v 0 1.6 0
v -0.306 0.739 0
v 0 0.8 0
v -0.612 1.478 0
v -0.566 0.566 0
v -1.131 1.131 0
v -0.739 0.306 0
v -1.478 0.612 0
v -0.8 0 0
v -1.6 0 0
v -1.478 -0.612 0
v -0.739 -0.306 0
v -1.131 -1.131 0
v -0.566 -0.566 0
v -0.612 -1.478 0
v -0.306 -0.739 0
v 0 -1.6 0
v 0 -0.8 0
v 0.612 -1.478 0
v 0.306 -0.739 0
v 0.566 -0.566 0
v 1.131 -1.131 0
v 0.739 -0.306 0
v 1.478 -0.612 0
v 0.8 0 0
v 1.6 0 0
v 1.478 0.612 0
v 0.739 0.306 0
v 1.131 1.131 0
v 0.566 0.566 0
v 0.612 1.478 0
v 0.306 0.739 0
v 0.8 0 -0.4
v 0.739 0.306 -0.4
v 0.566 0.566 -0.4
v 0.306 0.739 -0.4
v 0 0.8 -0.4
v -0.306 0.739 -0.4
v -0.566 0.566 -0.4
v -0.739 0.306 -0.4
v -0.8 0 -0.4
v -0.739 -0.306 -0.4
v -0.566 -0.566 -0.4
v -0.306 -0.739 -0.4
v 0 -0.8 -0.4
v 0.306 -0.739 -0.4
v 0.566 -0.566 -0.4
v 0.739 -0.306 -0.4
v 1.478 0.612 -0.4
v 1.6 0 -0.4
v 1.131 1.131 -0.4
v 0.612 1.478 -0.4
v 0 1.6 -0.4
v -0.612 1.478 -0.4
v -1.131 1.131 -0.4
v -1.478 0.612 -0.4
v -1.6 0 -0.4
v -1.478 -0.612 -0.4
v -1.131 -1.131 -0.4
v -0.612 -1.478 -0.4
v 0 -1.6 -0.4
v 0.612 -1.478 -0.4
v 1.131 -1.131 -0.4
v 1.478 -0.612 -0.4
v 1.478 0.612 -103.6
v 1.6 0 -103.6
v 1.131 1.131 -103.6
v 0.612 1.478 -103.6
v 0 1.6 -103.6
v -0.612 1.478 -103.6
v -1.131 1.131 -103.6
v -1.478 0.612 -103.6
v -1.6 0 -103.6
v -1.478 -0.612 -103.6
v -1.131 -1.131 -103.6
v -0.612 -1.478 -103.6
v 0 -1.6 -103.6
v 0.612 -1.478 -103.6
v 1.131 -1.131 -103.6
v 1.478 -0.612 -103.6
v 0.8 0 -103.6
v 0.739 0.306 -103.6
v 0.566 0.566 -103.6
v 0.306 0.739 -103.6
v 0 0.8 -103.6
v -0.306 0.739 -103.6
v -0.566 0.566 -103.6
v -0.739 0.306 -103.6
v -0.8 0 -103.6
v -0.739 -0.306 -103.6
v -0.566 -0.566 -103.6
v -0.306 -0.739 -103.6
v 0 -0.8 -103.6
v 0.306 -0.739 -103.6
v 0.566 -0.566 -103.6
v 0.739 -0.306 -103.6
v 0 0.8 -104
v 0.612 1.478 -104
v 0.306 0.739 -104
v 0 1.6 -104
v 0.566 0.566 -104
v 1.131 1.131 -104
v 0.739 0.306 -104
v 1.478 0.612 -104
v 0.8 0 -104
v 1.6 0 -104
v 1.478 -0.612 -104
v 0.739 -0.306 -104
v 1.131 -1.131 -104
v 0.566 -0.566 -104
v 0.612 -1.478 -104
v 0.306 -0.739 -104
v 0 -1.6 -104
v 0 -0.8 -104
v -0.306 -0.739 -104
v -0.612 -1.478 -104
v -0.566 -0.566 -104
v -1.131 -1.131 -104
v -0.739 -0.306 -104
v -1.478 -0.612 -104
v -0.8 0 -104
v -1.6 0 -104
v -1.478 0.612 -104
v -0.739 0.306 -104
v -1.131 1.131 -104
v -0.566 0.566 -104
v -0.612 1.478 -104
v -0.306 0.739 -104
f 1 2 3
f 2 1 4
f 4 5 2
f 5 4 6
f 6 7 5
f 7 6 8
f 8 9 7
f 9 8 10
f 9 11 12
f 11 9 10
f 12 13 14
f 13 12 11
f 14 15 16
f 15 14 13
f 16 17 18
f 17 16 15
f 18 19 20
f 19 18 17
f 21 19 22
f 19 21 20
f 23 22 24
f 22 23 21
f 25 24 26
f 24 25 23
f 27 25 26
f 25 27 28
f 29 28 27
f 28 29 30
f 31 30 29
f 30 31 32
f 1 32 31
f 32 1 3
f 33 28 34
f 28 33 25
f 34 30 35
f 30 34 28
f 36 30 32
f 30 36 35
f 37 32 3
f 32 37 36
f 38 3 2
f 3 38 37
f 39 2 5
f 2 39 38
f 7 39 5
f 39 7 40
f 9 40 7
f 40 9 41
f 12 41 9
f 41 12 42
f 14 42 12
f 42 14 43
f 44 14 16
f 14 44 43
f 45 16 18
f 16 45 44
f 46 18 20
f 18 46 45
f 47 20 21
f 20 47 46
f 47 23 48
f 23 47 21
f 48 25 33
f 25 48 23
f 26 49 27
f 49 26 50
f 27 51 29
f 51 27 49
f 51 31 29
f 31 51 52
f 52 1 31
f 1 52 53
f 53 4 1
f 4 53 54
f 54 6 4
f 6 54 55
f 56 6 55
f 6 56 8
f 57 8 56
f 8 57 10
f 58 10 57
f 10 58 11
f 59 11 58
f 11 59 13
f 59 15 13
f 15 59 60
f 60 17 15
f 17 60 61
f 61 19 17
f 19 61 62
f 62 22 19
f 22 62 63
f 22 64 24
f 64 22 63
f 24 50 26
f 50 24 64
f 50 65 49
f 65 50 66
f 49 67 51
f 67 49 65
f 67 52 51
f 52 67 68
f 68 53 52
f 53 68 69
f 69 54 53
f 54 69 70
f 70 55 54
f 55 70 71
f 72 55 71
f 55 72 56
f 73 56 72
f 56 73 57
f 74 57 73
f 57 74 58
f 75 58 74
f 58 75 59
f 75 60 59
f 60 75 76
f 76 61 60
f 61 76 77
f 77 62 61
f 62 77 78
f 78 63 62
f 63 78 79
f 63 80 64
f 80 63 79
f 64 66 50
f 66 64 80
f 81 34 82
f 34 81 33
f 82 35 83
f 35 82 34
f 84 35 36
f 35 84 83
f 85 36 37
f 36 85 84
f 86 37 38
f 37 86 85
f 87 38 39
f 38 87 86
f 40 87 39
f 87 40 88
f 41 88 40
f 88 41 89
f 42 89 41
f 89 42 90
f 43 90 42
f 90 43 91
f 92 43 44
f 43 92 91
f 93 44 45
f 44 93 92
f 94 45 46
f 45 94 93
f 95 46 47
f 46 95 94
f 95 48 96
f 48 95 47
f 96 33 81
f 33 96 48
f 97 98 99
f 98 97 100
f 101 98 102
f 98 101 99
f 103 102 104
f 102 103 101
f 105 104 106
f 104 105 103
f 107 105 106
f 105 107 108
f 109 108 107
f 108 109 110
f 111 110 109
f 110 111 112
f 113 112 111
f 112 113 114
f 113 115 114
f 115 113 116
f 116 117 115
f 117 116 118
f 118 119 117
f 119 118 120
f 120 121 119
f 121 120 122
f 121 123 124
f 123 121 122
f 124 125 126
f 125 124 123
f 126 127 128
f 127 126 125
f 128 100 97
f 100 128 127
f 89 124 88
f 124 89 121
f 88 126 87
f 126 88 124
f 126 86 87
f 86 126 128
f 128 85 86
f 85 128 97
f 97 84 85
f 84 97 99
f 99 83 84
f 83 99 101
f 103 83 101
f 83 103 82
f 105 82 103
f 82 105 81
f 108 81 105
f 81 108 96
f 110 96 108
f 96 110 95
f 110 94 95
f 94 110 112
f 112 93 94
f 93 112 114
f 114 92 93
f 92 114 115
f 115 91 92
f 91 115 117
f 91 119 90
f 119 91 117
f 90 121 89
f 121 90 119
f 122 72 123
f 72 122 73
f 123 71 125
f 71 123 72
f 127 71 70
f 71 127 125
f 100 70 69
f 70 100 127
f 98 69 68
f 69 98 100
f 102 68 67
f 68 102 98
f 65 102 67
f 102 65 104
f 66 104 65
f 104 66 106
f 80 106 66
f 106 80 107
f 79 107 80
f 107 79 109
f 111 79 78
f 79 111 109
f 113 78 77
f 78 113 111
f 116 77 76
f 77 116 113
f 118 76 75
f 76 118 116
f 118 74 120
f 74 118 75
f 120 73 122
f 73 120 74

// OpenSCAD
// file: ../p/4-4disc.scad
use <../lib.scad>
$fa=1; $fs=0.2;
function ldraw_lib__4_4disc(realsolid=false) = [
// 0 Disc 1.0
// 0 Name: 4-4disc.dat
// 0 Author: James Jessiman
// 0 !LDRAW_ORG Primitive UPDATE 2002-02
// 0 !LICENSE Licensed under CC BY 2.0 and CC BY 4.0 : see CAreadme.txt
// 
// 0 BFC CERTIFY CCW
  [0,"BFC","CERTIFY"],
  [0,"BFC","CCW"],
// 
// 0 !HISTORY 1998-12-15 [PTadmin] Official Update 1998-10
// 0 !HISTORY 2002-03-23 [sbliss] Added BFC statement
// 0 !HISTORY 2002-04-25 [PTadmin] Official Update 2002-02
// 0 !HISTORY 2007-06-24 [PTadmin] Header formatted for Contributor Agreement
// 0 !HISTORY 2008-07-01 [PTadmin] Official Update 2008-01
// 
// 
// 3 16 0 0 0 1 0 0 0.9239 0 0.3827
  [3,16,0,0,0,1,0,0,0.9239,0,0.3827],
// 3 16 0 0 0 0.9239 0 0.3827 0.7071 0 0.7071
  [3,16,0,0,0,0.9239,0,0.3827,0.7071,0,0.7071],
// 3 16 0 0 0 0.7071 0 0.7071 0.3827 0 0.9239
  [3,16,0,0,0,0.7071,0,0.7071,0.3827,0,0.9239],
// 3 16 0 0 0 0.3827 0 0.9239 0 0 1
  [3,16,0,0,0,0.3827,0,0.9239,0,0,1],
// 3 16 0 0 0 0 0 1 -0.3827 0 0.9239
  [3,16,0,0,0,0,0,1,-0.3827,0,0.9239],
// 3 16 0 0 0 -0.3827 0 0.9239 -0.7071 0 0.7071
  [3,16,0,0,0,-0.3827,0,0.9239,-0.7071,0,0.7071],
// 3 16 0 0 0 -0.7071 0 0.7071 -0.9239 0 0.3827
  [3,16,0,0,0,-0.7071,0,0.7071,-0.9239,0,0.3827],
// 3 16 0 0 0 -0.9239 0 0.3827 -1 0 -0
  [3,16,0,0,0,-0.9239,0,0.3827,-1,0,-0],
// 3 16 0 0 0 -1 0 -0 -0.9239 0 -0.3827
  [3,16,0,0,0,-1,0,-0,-0.9239,0,-0.3827],
// 3 16 0 0 0 -0.9239 0 -0.3827 -0.7071 0 -0.7071
  [3,16,0,0,0,-0.9239,0,-0.3827,-0.7071,0,-0.7071],
// 3 16 0 0 0 -0.7071 0 -0.7071 -0.3827 0 -0.9239
  [3,16,0,0,0,-0.7071,0,-0.7071,-0.3827,0,-0.9239],
// 3 16 0 0 0 -0.3827 0 -0.9239 0 0 -1
  [3,16,0,0,0,-0.3827,0,-0.9239,0,0,-1],
// 3 16 0 0 0 0 0 -1 0.3827 0 -0.9239
  [3,16,0,0,0,0,0,-1,0.3827,0,-0.9239],
// 3 16 0 0 0 0.3827 0 -0.9239 0.7071 0 -0.7071
  [3,16,0,0,0,0.3827,0,-0.9239,0.7071,0,-0.7071],
// 3 16 0 0 0 0.7071 0 -0.7071 0.9239 0 -0.3827
  [3,16,0,0,0,0.7071,0,-0.7071,0.9239,0,-0.3827],
// 3 16 0 0 0 0.9239 0 -0.3827 1 0 0
  [3,16,0,0,0,0.9239,0,-0.3827,1,0,0],
// 0
];
module ldraw_lib__4_4disc(step=0, col=false, unit=2/5, alt=false, line=0.2, solid=!$preview)
    makepoly(ldraw_lib__4_4disc(solid), step=step, col=col, unit=unit, alt=alt, line=line, solid=solid);
ldraw_lib__4_4disc(line=0.2);
// file: ../p/stud3.scad
use <../lib.scad>
use <4-4cyli.scad>
use <4-4disc.scad>
use <4-4edge.scad>
$fa=1; $fs=0.2;
function ldraw_lib__stud3(realsolid=false) = realsolid ? 
    [openscad(translate([0,0,-eps()], o=cylinder(4+eps(), r=4)),2)] : [
// 0 Stud Tube Solid
// 0 Name: stud3.dat
// 0 Author: James Jessiman
// 0 !LDRAW_ORG Primitive UPDATE 2012-01
// 0 !LICENSE Licensed under CC BY 2.0 and CC BY 4.0 : see CAreadme.txt
// 
// 0 BFC CERTIFY CCW
  [0,"BFC","CERTIFY"],
  [0,"BFC","CCW"],
// 
// 0 !HISTORY 2002-04-04 [sbliss] Modified for BFC compliance
// 0 !HISTORY 2002-04-25 [PTadmin] Official Update 2002-02
// 0 !HISTORY 2007-06-24 [PTadmin] Header formatted for Contributor Agreement
// 0 !HISTORY 2008-07-01 [PTadmin] Official Update 2008-01
// 0 !HISTORY 2012-02-16 [Philo] Changed to CCW
// 0 !HISTORY 2012-03-30 [PTadmin] Official Update 2012-01
// 
// 
// 1 16 0 -4 0 4 0 0 0 1 0 0 0 4 4-4edge.dat
  [1,16,0,-4,0,4,0,0,0,1,0,0,0,4, ldraw_lib__4_4edge(realsolid)],
// 1 16 0 0 0 4 0 0 0 1 0 0 0 4 4-4edge.dat
  [1,16,0,0,0,4,0,0,0,1,0,0,0,4, ldraw_lib__4_4edge(realsolid)],
// 1 16 0 -4 0 4 0 0 0 1 0 0 0 4 4-4disc.dat
  [1,16,0,-4,0,4,0,0,0,1,0,0,0,4, ldraw_lib__4_4disc(realsolid)],
// 1 16 0 -4 0 4 0 0 0 4 0 0 0 4 4-4cyli.dat
  [1,16,0,-4,0,4,0,0,0,4,0,0,0,4, ldraw_lib__4_4cyli(realsolid)],
];
module ldraw_lib__stud3(step=0, col=false, unit=2/5, alt=false, line=0.2, solid=!$preview)
    makepoly(ldraw_lib__stud3(solid), step=step, col=col, unit=unit, alt=alt, line=line, solid=solid);
ldraw_lib__stud3(line=0.2);
// file: ../p/stud.scad
use <../lib.scad>
use <4-4cyli.scad>
use <4-4disc.scad>
use <4-4edge.scad>
$fa=1; $fs=0.2;
function ldraw_lib__stud(realsolid=false) = realsolid ? 
    [openscad(translate([0,0,-eps()], o=cylinder(4+eps(), r=6)),2)] : [
// 0 Stud
// 0 Name: stud.dat
// 0 Author: James Jessiman
// 0 !LDRAW_ORG Primitive UPDATE 2012-01
// 0 !LICENSE Licensed under CC BY 2.0 and CC BY 4.0 : see CAreadme.txt
// 
// 0 BFC CERTIFY CCW
  [0,"BFC","CERTIFY"],
  [0,"BFC","CCW"],
// 
// 0 !HISTORY 2002-04-04 [sbliss] Modified for BFC compliance
// 0 !HISTORY 2002-04-25 [PTadmin] Official Update 2002-02
// 0 !HISTORY 2007-06-24 [PTadmin] Header formatted for Contributor Agreement
// 0 !HISTORY 2008-07-01 [PTadmin] Official Update 2008-01
// 0 !HISTORY 2012-02-16 [Philo] Changed to CCW
// 0 !HISTORY 2012-03-30 [PTadmin] Official Update 2012-01
// 
// 
// 1 16 0 0 0 6 0 0 0 1 0 0 0 6 4-4edge.dat
  [1,16,0,0,0,6,0,0,0,1,0,0,0,6, ldraw_lib__4_4edge(realsolid)],
// 1 16 0 -4 0 6 0 0 0 1 0 0 0 6 4-4edge.dat
  [1,16,0,-4,0,6,0,0,0,1,0,0,0,6, ldraw_lib__4_4edge(realsolid)],
// 1 16 0 0 0 6 0 0 0 -4 0 0 0 6 4-4cyli.dat
  [1,16,0,0,0,6,0,0,0,-4,0,0,0,6, ldraw_lib__4_4cyli(realsolid)],
// 1 16 0 -4 0 6 0 0 0 1 0 0 0 6 4-4disc.dat
  [1,16,0,-4,0,6,0,0,0,1,0,0,0,6, ldraw_lib__4_4disc(realsolid)],
];
module ldraw_lib__stud(step=0, col=false, unit=2/5, alt=false, line=0.2, solid=!$preview)
    makepoly(ldraw_lib__stud(solid), step=step, col=col, unit=unit, alt=alt, line=line, solid=solid);
ldraw_lib__stud(line=0.2);
// file: ../p/box5.scad
use <../lib.scad>
$fa=1; $fs=0.2;
function ldraw_lib__box5(realsolid=false) = [
// 0 Box with 5 Faces and All Edges
// 0 Name: box5.dat
// 0 Author: James Jessiman
// 0 !LDRAW_ORG Primitive UPDATE 2012-01
// 0 !LICENSE Licensed under CC BY 2.0 and CC BY 4.0 : see CAreadme.txt
// 
// 0 BFC CERTIFY CCW
  [0,"BFC","CERTIFY"],
  [0,"BFC","CCW"],
// 
// 0 !HISTORY 2002-04-03 [sbliss] Modified for BFC compliance
// 0 !HISTORY 2002-04-25 [PTadmin] Official Update 2002-02
// 0 !HISTORY 2007-06-24 [PTadmin] Header formatted for Contributor Agreement
// 0 !HISTORY 2008-07-01 [PTadmin] Official Update 2008-01
// 0 !HISTORY 2012-02-16 [Philo] Changed to CCW
// 0 !HISTORY 2012-03-30 [PTadmin] Official Update 2012-01
// 
// 
// 2 24 1 1 1 -1 1 1
  [2,24,1,1,1,-1,1,1],
// 2 24 -1 1 1 -1 1 -1
  [2,24,-1,1,1,-1,1,-1],
// 2 24 -1 1 -1 1 1 -1
  [2,24,-1,1,-1,1,1,-1],
// 2 24 1 1 -1 1 1 1
  [2,24,1,1,-1,1,1,1],
// 2 24 1 0 1 -1 0 1
  [2,24,1,0,1,-1,0,1],
// 2 24 -1 0 1 -1 0 -1
  [2,24,-1,0,1,-1,0,-1],
// 2 24 -1 0 -1 1 0 -1
  [2,24,-1,0,-1,1,0,-1],
// 2 24 1 0 -1 1 0 1
  [2,24,1,0,-1,1,0,1],
// 2 24 1 0 1 1 1 1
  [2,24,1,0,1,1,1,1],
// 2 24 -1 0 1 -1 1 1
  [2,24,-1,0,1,-1,1,1],
// 2 24 1 0 -1 1 1 -1
  [2,24,1,0,-1,1,1,-1],
// 2 24 -1 0 -1 -1 1 -1
  [2,24,-1,0,-1,-1,1,-1],
// 4 16 -1 1 1 1 1 1 1 1 -1 -1 1 -1
  [4,16,-1,1,1,1,1,1,1,1,-1,-1,1,-1],
// 4 16 -1 1 1 -1 0 1 1 0 1 1 1 1
  [4,16,-1,1,1,-1,0,1,1,0,1,1,1,1],
// 4 16 -1 1 -1 -1 0 -1 -1 0 1 -1 1 1
  [4,16,-1,1,-1,-1,0,-1,-1,0,1,-1,1,1],
// 4 16 1 1 -1 1 0 -1 -1 0 -1 -1 1 -1
  [4,16,1,1,-1,1,0,-1,-1,0,-1,-1,1,-1],
// 4 16 1 1 1 1 0 1 1 0 -1 1 1 -1
  [4,16,1,1,1,1,0,1,1,0,-1,1,1,-1],
];
module ldraw_lib__box5(step=0, col=false, unit=2/5, alt=false, line=0.2, solid=!$preview)
    makepoly(ldraw_lib__box5(solid), step=step, col=col, unit=unit, alt=alt, line=line, solid=solid);
ldraw_lib__box5(line=0.2);
// file: ../p/box4t.scad
use <../lib.scad>
$fa=1; $fs=0.2;
function ldraw_lib__box4t(realsolid=false) = [
// 0 Box with 4 Adjacent Faces and All Edges
// 0 Name: box4t.dat
// 0 Author: Tore Eriksson [Tore_Eriksson]
// 0 !LDRAW_ORG Primitive UPDATE 2003-02
// 0 !LICENSE Licensed under CC BY 2.0 and CC BY 4.0 : see CAreadme.txt
// 
// 0 BFC CERTIFY CCW
  [0,"BFC","CERTIFY"],
  [0,"BFC","CCW"],
// 
// 0 !HISTORY 1997-09-29 [PTadmin] Official Update 1997-15
// 0 !HISTORY 2002-08-31 [izanette] Modified with WINDZ for BFC compliance
// 0 !HISTORY 2003-08-01 [PTadmin] Official Update 2003-02
// 0 !HISTORY 2007-06-24 [PTadmin] Header formatted for Contributor Agreement
// 0 !HISTORY 2008-07-01 [PTadmin] Official Update 2008-01
// 
// 
// 2 24 1 1 1 -1 1 1
  [2,24,1,1,1,-1,1,1],
// 2 24 -1 1 1 -1 1 -1
  [2,24,-1,1,1,-1,1,-1],
// 2 24 -1 1 -1 1 1 -1
  [2,24,-1,1,-1,1,1,-1],
// 2 24 1 1 -1 1 1 1
  [2,24,1,1,-1,1,1,1],
// 2 24 1 0 1 -1 0 1
  [2,24,1,0,1,-1,0,1],
// 2 24 -1 0 1 -1 0 -1
  [2,24,-1,0,1,-1,0,-1],
// 2 24 -1 0 -1 1 0 -1
  [2,24,-1,0,-1,1,0,-1],
// 2 24 1 0 -1 1 0 1
  [2,24,1,0,-1,1,0,1],
// 2 24 1 0 1 1 1 1
  [2,24,1,0,1,1,1,1],
// 2 24 -1 0 1 -1 1 1
  [2,24,-1,0,1,-1,1,1],
// 2 24 1 0 -1 1 1 -1
  [2,24,1,0,-1,1,1,-1],
// 2 24 -1 0 -1 -1 1 -1
  [2,24,-1,0,-1,-1,1,-1],
// 4 16 1 1 1 1 1 -1 -1 1 -1 -1 1 1
  [4,16,1,1,1,1,1,-1,-1,1,-1,-1,1,1],
// 4 16 1 1 1 -1 1 1 -1 0 1 1 0 1
  [4,16,1,1,1,-1,1,1,-1,0,1,1,0,1],
// 4 16 -1 1 1 -1 1 -1 -1 0 -1 -1 0 1
  [4,16,-1,1,1,-1,1,-1,-1,0,-1,-1,0,1],
// 0 4 16 -1 1 -1 -1 0 -1 1 0 -1 1 1 -1
// 4 16 1 1 -1 1 1 1 1 0 1 1 0 -1
  [4,16,1,1,-1,1,1,1,1,0,1,1,0,-1],
// 0
];
module ldraw_lib__box4t(step=0, col=false, unit=2/5, alt=false, line=0.2, solid=!$preview)
    makepoly(ldraw_lib__box4t(solid), step=step, col=col, unit=unit, alt=alt, line=line, solid=solid);
ldraw_lib__box4t(line=0.2);
// file: s/3004s01.scad
use <../../lib.scad>
use <../../p/box4t.scad>
use <../../p/box5.scad>
use <../../p/stud.scad>
use <../../p/stud3.scad>
$fa=1; $fs=0.2;
function ldraw_lib__s__3004s01(realsolid=false) = [
// 0 ~Brick  1 x  2 without Front Face
// 0 Name: s\3004s01.dat
// 0 Author: James Jessiman
// 0 !LDRAW_ORG Subpart UPDATE 2003-03
// 0 !LICENSE Licensed under CC BY 2.0 and CC BY 4.0 : see CAreadme.txt
// 
// 0 BFC CERTIFY CCW
  [0,"BFC","CERTIFY"],
  [0,"BFC","CCW"],
// 
// 0 !HISTORY 2003-09-07 [jriley] Subfiling, BFC
// 0 !HISTORY 2003-12-19 [PTadmin] Official Update 2003-03
// 0 !HISTORY 2007-08-29 [PTadmin] Header formatted for Contributor Agreement
// 0 !HISTORY 2008-07-01 [PTadmin] Official Update 2008-01
// 
// 
// 1 16 0 4 0 1 0 0 0 -5 0 0 0 1 stud3.dat
  [1,16,0,4,0,1,0,0,0,-5,0,0,0,1, ldraw_lib__stud3(realsolid)],
// 0 BFC INVERTNEXT
  [0,"BFC","INVERTNEXT"],
// 1 16 0 24 0 16 0 0 0 -20 0 0 0 6 box5.dat
  [1,16,0,24,0,16,0,0,0,-20,0,0,0,6, ldraw_lib__box5(realsolid)],
// 4 16 20 24 10 16 24 6 -16 24 6 -20 24 10
  [4,16,20,24,10,16,24,6,-16,24,6,-20,24,10],
// 4 16 -20 24 10 -16 24 6 -16 24 -6 -20 24 -10
  [4,16,-20,24,10,-16,24,6,-16,24,-6,-20,24,-10],
// 4 16 -20 24 -10 -16 24 -6 16 24 -6 20 24 -10
  [4,16,-20,24,-10,-16,24,-6,16,24,-6,20,24,-10],
// 4 16 20 24 -10 16 24 -6 16 24 6 20 24 10
  [4,16,20,24,-10,16,24,-6,16,24,6,20,24,10],
// 1 16 0 24 0 20 0 0 0 -24 0 0 0 10 box4t.dat
  [1,16,0,24,0,20,0,0,0,-24,0,0,0,10, ldraw_lib__box4t(realsolid)],
// 1 16 10 0 0 1 0 0 0 1 0 0 0 1 stud.dat
  [1,16,10,0,0,1,0,0,0,1,0,0,0,1, ldraw_lib__stud(realsolid)],
// 1 16 -10 0 0 1 0 0 0 1 0 0 0 1 stud.dat
  [1,16,-10,0,0,1,0,0,0,1,0,0,0,1, ldraw_lib__stud(realsolid)],
// 0
];
module ldraw_lib__s__3004s01(step=0, col=false, unit=2/5, alt=false, line=0.2, solid=!$preview)
    makepoly(ldraw_lib__s__3004s01(solid), step=step, col=col, unit=unit, alt=alt, line=line, solid=solid);
ldraw_lib__s__3004s01(line=0.2);
// file: ../p/4-4ring1.scad
use <../lib.scad>
$fa=1; $fs=0.2;
function ldraw_lib__4_4ring1(realsolid=false) = [
// 0 Ring  1 x 1.0
// 0 Name: 4-4ring1.dat
// 0 Author: James Jessiman
// 0 !LDRAW_ORG Primitive UPDATE 2009-01
// 0 !LICENSE Licensed under CC BY 2.0 and CC BY 4.0 : see CAreadme.txt
// 
// 0 BFC CERTIFY CCW
  [0,"BFC","CERTIFY"],
  [0,"BFC","CCW"],
// 
// 0 !HISTORY 1998-12-15 [PTadmin] Official Update 1998-10
// 0 !HISTORY 2002-04-08 [BrickCaster] Modified for BFC compliance
// 0 !HISTORY 2002-04-25 [PTadmin] Official Update 2002-02
// 0 !HISTORY 2007-06-24 [PTadmin] Header formatted for Contributor Agreement
// 0 !HISTORY 2008-07-01 [PTadmin] Official Update 2008-01
// 0 !HISTORY 2008-08-26 [cwdee] Switch polygon winding and rename
// 0 !HISTORY 2009-05-02 [PTadmin] Official Update 2009-01
// 
// 
// 4 16 -0.7654 0 1.8478 -0.3827 0 0.9239 0 0 1 0 0 2
  [4,16,-0.7654,0,1.8478,-0.3827,0,0.9239,0,0,1,0,0,2],
// 4 16 -1.4142 0 1.4142 -0.7071 0 0.7071 -0.3827 0 0.9239 -0.7654 0 1.8478
  [4,16,-1.4142,0,1.4142,-0.7071,0,0.7071,-0.3827,0,0.9239,-0.7654,0,1.8478],
// 4 16 -1.8478 0 0.7654 -0.9239 0 0.3827 -0.7071 0 0.7071 -1.4142 0 1.41420
  [4,16,-1.8478,0,0.7654,-0.9239,0,0.3827,-0.7071,0,0.7071,-1.4142,0,1.41420],
// 4 16 -2 0 0 -1 0 0 -0.9239 0 0.3827 -1.8478 0 0.7654
  [4,16,-2,0,0,-1,0,0,-0.9239,0,0.3827,-1.8478,0,0.7654],
// 4 16 -1.8478 0 -0.7654 -0.9239 0 -0.3827 -1 0 0 -2 0 0
  [4,16,-1.8478,0,-0.7654,-0.9239,0,-0.3827,-1,0,0,-2,0,0],
// 4 16 -1.4142 0 -1.4142 -0.7071 0 -0.7071 -0.9239 0 -0.3827 -1.8478 0 -0.7654
  [4,16,-1.4142,0,-1.4142,-0.7071,0,-0.7071,-0.9239,0,-0.3827,-1.8478,0,-0.7654],
// 4 16 -0.7654 0 -1.8478 -0.3827 0 -0.9239 -0.7071 0 -0.7071 -1.4142 0 -1.4142
  [4,16,-0.7654,0,-1.8478,-0.3827,0,-0.9239,-0.7071,0,-0.7071,-1.4142,0,-1.4142],
// 4 16 0 0 -2 0 0 -1 -0.3827 0 -0.9239 -0.7654 0 -1.8478
  [4,16,0,0,-2,0,0,-1,-0.3827,0,-0.9239,-0.7654,0,-1.8478],
// 4 16 0.7654 0 -1.8478 0.3827 0 -0.9239 0 0 -1 0 0 -2
  [4,16,0.7654,0,-1.8478,0.3827,0,-0.9239,0,0,-1,0,0,-2],
// 4 16 1.4142 0 -1.4142 0.7071 0 -0.7071 0.3827 0 -0.9239 0.7654 0 -1.8478
  [4,16,1.4142,0,-1.4142,0.7071,0,-0.7071,0.3827,0,-0.9239,0.7654,0,-1.8478],
// 4 16 1.8478 0 -0.7654 0.9239 0 -0.3827 0.7071 0 -0.7071 1.4142 0 -1.4142
  [4,16,1.8478,0,-0.7654,0.9239,0,-0.3827,0.7071,0,-0.7071,1.4142,0,-1.4142],
// 4 16 2 0 0 1 0 0 0.9239 0 -0.3827 1.8478 0 -0.7654
  [4,16,2,0,0,1,0,0,0.9239,0,-0.3827,1.8478,0,-0.7654],
// 4 16 1.8478 0 0.7654 0.9239 0 0.3827 1 0 0 2 0 0
  [4,16,1.8478,0,0.7654,0.9239,0,0.3827,1,0,0,2,0,0],
// 4 16 1.4142 0 1.4142 0.7071 0 0.7071 0.9239 0 0.3827 1.8478 0 0.7654
  [4,16,1.4142,0,1.4142,0.7071,0,0.7071,0.9239,0,0.3827,1.8478,0,0.7654],
// 4 16 0.7654 0 1.8478 0.3827 0 0.9239 0.7071 0 0.7071 1.4142 0 1.4142
  [4,16,0.7654,0,1.8478,0.3827,0,0.9239,0.7071,0,0.7071,1.4142,0,1.4142],
// 4 16 0 0 2 0 0 1 0.3827 0 0.9239 0.7654 0 1.8478
  [4,16,0,0,2,0,0,1,0.3827,0,0.9239,0.7654,0,1.8478],
// 0
];
module ldraw_lib__4_4ring1(step=0, col=false, unit=2/5, alt=false, line=0.2, solid=!$preview)
    makepoly(ldraw_lib__4_4ring1(solid), step=step, col=col, unit=unit, alt=alt, line=line, solid=solid);
ldraw_lib__4_4ring1(line=0.2);
// file: ../p/4-4edge.scad
use <../lib.scad>
$fa=1; $fs=0.2;
function ldraw_lib__4_4edge(realsolid=false) = [
// 0 Circle 1.0
// 0 Name: 4-4edge.dat
// 0 Author: James Jessiman
// 0 !LDRAW_ORG Primitive UPDATE 2017-01
// 0 !LICENSE Licensed under CC BY 2.0 and CC BY 4.0 : see CAreadme.txt
// 
// 0 BFC CERTIFY CCW
  [0,"BFC","CERTIFY"],
  [0,"BFC","CCW"],
// 
// 0 !HISTORY 1998-12-15 [PTadmin] Official Update 1998-10
// 0 !HISTORY 2005-12-28 [PTadmin] Official Update 2005-01
// 0 !HISTORY 2007-06-24 [PTadmin] Header formatted for Contributor Agreement
// 0 !HISTORY 2008-07-01 [PTadmin] Official Update 2008-01
// 0 !HISTORY 2017-01-15 [Steffen] BFCed
// 0 !HISTORY 2017-12-30 [PTadmin] Official Update 2017-01
// 
// 
// 2 24 1 0 0 0.9239 0 0.3827
  [2,24,1,0,0,0.9239,0,0.3827],
// 2 24 0.9239 0 0.3827 0.7071 0 0.7071
  [2,24,0.9239,0,0.3827,0.7071,0,0.7071],
// 2 24 0.7071 0 0.7071 0.3827 0 0.9239
  [2,24,0.7071,0,0.7071,0.3827,0,0.9239],
// 2 24 0.3827 0 0.9239 0 0 1
  [2,24,0.3827,0,0.9239,0,0,1],
// 2 24 0 0 1 -0.3827 0 0.9239
  [2,24,0,0,1,-0.3827,0,0.9239],
// 2 24 -0.3827 0 0.9239 -0.7071 0 0.7071
  [2,24,-0.3827,0,0.9239,-0.7071,0,0.7071],
// 2 24 -0.7071 0 0.7071 -0.9239 0 0.3827
  [2,24,-0.7071,0,0.7071,-0.9239,0,0.3827],
// 2 24 -0.9239 0 0.3827 -1 0 -0
  [2,24,-0.9239,0,0.3827,-1,0,-0],
// 2 24 -1 0 -0 -0.9239 0 -0.3827
  [2,24,-1,0,-0,-0.9239,0,-0.3827],
// 2 24 -0.9239 0 -0.3827 -0.7071 0 -0.7071
  [2,24,-0.9239,0,-0.3827,-0.7071,0,-0.7071],
// 2 24 -0.7071 0 -0.7071 -0.3827 0 -0.9239
  [2,24,-0.7071,0,-0.7071,-0.3827,0,-0.9239],
// 2 24 -0.3827 0 -0.9239 0 0 -1
  [2,24,-0.3827,0,-0.9239,0,0,-1],
// 2 24 0 0 -1 0.3827 0 -0.9239
  [2,24,0,0,-1,0.3827,0,-0.9239],
// 2 24 0.3827 0 -0.9239 0.7071 0 -0.7071
  [2,24,0.3827,0,-0.9239,0.7071,0,-0.7071],
// 2 24 0.7071 0 -0.7071 0.9239 0 -0.3827
  [2,24,0.7071,0,-0.7071,0.9239,0,-0.3827],
// 2 24 0.9239 0 -0.3827 1 0 0
  [2,24,0.9239,0,-0.3827,1,0,0],
];
module ldraw_lib__4_4edge(step=0, col=false, unit=2/5, alt=false, line=0.2, solid=!$preview)
    makepoly(ldraw_lib__4_4edge(solid), step=step, col=col, unit=unit, alt=alt, line=line, solid=solid);
ldraw_lib__4_4edge(line=0.2);
// file: ../p/4-4cyli.scad
use <../lib.scad>
$fa=1; $fs=0.2;
function ldraw_lib__4_4cyli(realsolid=false) = [
// 0 Cylinder 1.0
// 0 Name: 4-4cyli.dat
// 0 Author: James Jessiman
// 0 !LDRAW_ORG Primitive UPDATE 2005-01
// 0 !LICENSE Licensed under CC BY 2.0 and CC BY 4.0 : see CAreadme.txt
// 
// 0 BFC CERTIFY CCW
  [0,"BFC","CERTIFY"],
  [0,"BFC","CCW"],
// 
// 0 !HISTORY 1998-12-15 [PTadmin] Official Update 1998-10
// 0 !HISTORY 2002-03-23 [sbliss] Added BFC statement; merged headers from files in distributions LDraw 0.27 and Complete.
// 0 !HISTORY 2002-04-25 [PTadmin] Official Update 2002-02
// 0 !HISTORY 2004-12-14 [guyvivan] BFC CCW
// 0 !HISTORY 2005-12-28 [PTadmin] Official Update 2005-01
// 0 !HISTORY 2007-06-24 [PTadmin] Header formatted for Contributor Agreement
// 0 !HISTORY 2008-07-01 [PTadmin] Official Update 2008-01
// 
// 
// 4 16 1 1 0 0.9239 1 0.3827 0.9239 0 0.3827 1 0 0
  [4,16,1,1,0,0.9239,1,0.3827,0.9239,0,0.3827,1,0,0],
// 5 24 1 0 0 1 1 0 0.9239 0 0.3827 0.9239 0 -0.3827
  [5,24,1,0,0,1,1,0,0.9239,0,0.3827,0.9239,0,-0.3827],
// 4 16 0.9239 1 0.3827 0.7071 1 0.7071 0.7071 0 0.7071 0.9239 0 0.3827
  [4,16,0.9239,1,0.3827,0.7071,1,0.7071,0.7071,0,0.7071,0.9239,0,0.3827],
// 5 24 0.9239 0 0.3827 0.9239 1 0.3827 0.7071 0 0.7071 1 0 0
  [5,24,0.9239,0,0.3827,0.9239,1,0.3827,0.7071,0,0.7071,1,0,0],
// 4 16 0.7071 1 0.7071 0.3827 1 0.9239 0.3827 0 0.9239 0.7071 0 0.7071
  [4,16,0.7071,1,0.7071,0.3827,1,0.9239,0.3827,0,0.9239,0.7071,0,0.7071],
// 5 24 0.7071 0 0.7071 0.7071 1 0.7071 0.3827 0 0.9239 0.9239 0 0.3827
  [5,24,0.7071,0,0.7071,0.7071,1,0.7071,0.3827,0,0.9239,0.9239,0,0.3827],
// 4 16 0.3827 1 0.9239 0 1 1 0 0 1 0.3827 0 0.9239
  [4,16,0.3827,1,0.9239,0,1,1,0,0,1,0.3827,0,0.9239],
// 5 24 0.3827 0 0.9239 0.3827 1 0.9239 0 0 1 0.7071 0 0.7071
  [5,24,0.3827,0,0.9239,0.3827,1,0.9239,0,0,1,0.7071,0,0.7071],
// 4 16 0 1 1 -0.3827 1 0.9239 -0.3827 0 0.9239 0 0 1
  [4,16,0,1,1,-0.3827,1,0.9239,-0.3827,0,0.9239,0,0,1],
// 5 24 0 0 1 0 1 1 -0.3827 0 0.9239 0.3827 0 0.9239
  [5,24,0,0,1,0,1,1,-0.3827,0,0.9239,0.3827,0,0.9239],
// 4 16 -0.3827 1 0.9239 -0.7071 1 0.7071 -0.7071 0 0.7071 -0.3827 0 0.9239
  [4,16,-0.3827,1,0.9239,-0.7071,1,0.7071,-0.7071,0,0.7071,-0.3827,0,0.9239],
// 5 24 -0.3827 0 0.9239 -0.3827 1 0.9239 -0.7071 0 0.7071 0 0 1
  [5,24,-0.3827,0,0.9239,-0.3827,1,0.9239,-0.7071,0,0.7071,0,0,1],
// 4 16 -0.7071 1 0.7071 -0.9239 1 0.3827 -0.9239 0 0.3827 -0.7071 0 0.7071
  [4,16,-0.7071,1,0.7071,-0.9239,1,0.3827,-0.9239,0,0.3827,-0.7071,0,0.7071],
// 5 24 -0.7071 0 0.7071 -0.7071 1 0.7071 -0.9239 0 0.3827 -0.3827 0 0.9239
  [5,24,-0.7071,0,0.7071,-0.7071,1,0.7071,-0.9239,0,0.3827,-0.3827,0,0.9239],
// 4 16 -0.9239 1 0.3827 -1 1 0 -1 0 0 -0.9239 0 0.3827
  [4,16,-0.9239,1,0.3827,-1,1,0,-1,0,0,-0.9239,0,0.3827],
// 5 24 -0.9239 0 0.3827 -0.9239 1 0.3827 -1 0 0 -0.7071 0 0.7071
  [5,24,-0.9239,0,0.3827,-0.9239,1,0.3827,-1,0,0,-0.7071,0,0.7071],
// 4 16 -1 1 0 -0.9239 1 -0.3827 -0.9239 0 -0.3827 -1 0 0
  [4,16,-1,1,0,-0.9239,1,-0.3827,-0.9239,0,-0.3827,-1,0,0],
// 5 24 -1 0 0 -1 1 0 -0.9239 0 -0.3827 -0.9239 0 0.3827
  [5,24,-1,0,0,-1,1,0,-0.9239,0,-0.3827,-0.9239,0,0.3827],
// 4 16 -0.9239 1 -0.3827 -0.7071 1 -0.7071 -0.7071 0 -0.7071 -0.9239 0 -0.3827
  [4,16,-0.9239,1,-0.3827,-0.7071,1,-0.7071,-0.7071,0,-0.7071,-0.9239,0,-0.3827],
// 5 24 -0.9239 0 -0.3827 -0.9239 1 -0.3827 -0.7071 0 -0.7071 -1 0 0
  [5,24,-0.9239,0,-0.3827,-0.9239,1,-0.3827,-0.7071,0,-0.7071,-1,0,0],
// 4 16 -0.7071 1 -0.7071 -0.3827 1 -0.9239 -0.3827 0 -0.9239 -0.7071 0 -0.7071
  [4,16,-0.7071,1,-0.7071,-0.3827,1,-0.9239,-0.3827,0,-0.9239,-0.7071,0,-0.7071],
// 5 24 -0.7071 0 -0.7071 -0.7071 1 -0.7071 -0.3827 0 -0.9239 -0.9239 0 -0.3827
  [5,24,-0.7071,0,-0.7071,-0.7071,1,-0.7071,-0.3827,0,-0.9239,-0.9239,0,-0.3827],
// 4 16 -0.3827 1 -0.9239 0 1 -1 0 0 -1 -0.3827 0 -0.9239
  [4,16,-0.3827,1,-0.9239,0,1,-1,0,0,-1,-0.3827,0,-0.9239],
// 5 24 -0.3827 0 -0.9239 -0.3827 1 -0.9239 0 0 -1 -0.7071 0 -0.7071
  [5,24,-0.3827,0,-0.9239,-0.3827,1,-0.9239,0,0,-1,-0.7071,0,-0.7071],
// 4 16 0 1 -1 0.3827 1 -0.9239 0.3827 0 -0.9239 0 0 -1
  [4,16,0,1,-1,0.3827,1,-0.9239,0.3827,0,-0.9239,0,0,-1],
// 5 24 0 0 -1 0 1 -1 0.3827 0 -0.9239 -0.3827 0 -0.9239
  [5,24,0,0,-1,0,1,-1,0.3827,0,-0.9239,-0.3827,0,-0.9239],
// 4 16 0.3827 1 -0.9239 0.7071 1 -0.7071 0.7071 0 -0.7071 0.3827 0 -0.9239
  [4,16,0.3827,1,-0.9239,0.7071,1,-0.7071,0.7071,0,-0.7071,0.3827,0,-0.9239],
// 5 24 0.3827 0 -0.9239 0.3827 1 -0.9239 0.7071 0 -0.7071 0 0 -1
  [5,24,0.3827,0,-0.9239,0.3827,1,-0.9239,0.7071,0,-0.7071,0,0,-1],
// 4 16 0.7071 1 -0.7071 0.9239 1 -0.3827 0.9239 0 -0.3827 0.7071 0 -0.7071
  [4,16,0.7071,1,-0.7071,0.9239,1,-0.3827,0.9239,0,-0.3827,0.7071,0,-0.7071],
// 5 24 0.7071 0 -0.7071 0.7071 1 -0.7071 0.9239 0 -0.3827 0.3827 0 -0.9239
  [5,24,0.7071,0,-0.7071,0.7071,1,-0.7071,0.9239,0,-0.3827,0.3827,0,-0.9239],
// 4 16 0.9239 1 -0.3827 1 1 0 1 0 0 0.9239 0 -0.3827
  [4,16,0.9239,1,-0.3827,1,1,0,1,0,0,0.9239,0,-0.3827],
// 5 24 0.9239 0 -0.3827 0.9239 1 -0.3827 1 0 0 0.7071 0 -0.7071
  [5,24,0.9239,0,-0.3827,0.9239,1,-0.3827,1,0,0,0.7071,0,-0.7071],
// 0
];
module ldraw_lib__4_4cyli(step=0, col=false, unit=2/5, alt=false, line=0.2, solid=!$preview)
    makepoly(ldraw_lib__4_4cyli(solid), step=step, col=col, unit=unit, alt=alt, line=line, solid=solid);
ldraw_lib__4_4cyli(line=0.2);
// file: 3004.scad
use <../lib.scad>
use <s/3004s01.scad>
$fa=1; $fs=0.2;
function ldraw_lib__3004(realsolid=false) = [
// 0 Brick  1 x  2
// 0 Name: 3004.dat
// 0 Author: James Jessiman
// 0 !LDRAW_ORG Part UPDATE 2022-05
// 0 !LICENSE Licensed under CC BY 2.0 and CC BY 4.0 : see CAreadme.txt
// 
// 0 BFC CERTIFY CCW
  [0,"BFC","CERTIFY"],
  [0,"BFC","CCW"],
// 
// 0 !HISTORY 2001-10-26 [PTadmin] Official Update 2001-01
// 0 !HISTORY 2002-05-07 {unknown} BFC Certification
// 0 !HISTORY 2002-06-11 [PTadmin] Official Update 2002-03
// 0 !HISTORY 2007-05-07 [PTadmin] Header formatted for Contributor Agreement
// 0 !HISTORY 2008-07-01 [PTadmin] Official Update 2008-01
// 0 !HISTORY 2022-08-04 [MagFors] Using subfile
// 0 !HISTORY 2022-09-15 [PTadmin] Official Update 2022-05
// 
// 
// 1 16 0 0 0 1 0 0 0 1 0 0 0 1 s\3004s01.dat
  [1,16,0,0,0,1,0,0,0,1,0,0,0,1, ldraw_lib__s__3004s01(realsolid)],
// 4 16 -20 24 -10 20 24 -10 20 0 -10 -20 0 -10
  [4,16,-20,24,-10,20,24,-10,20,0,-10,-20,0,-10],
];
module ldraw_lib__3004(step=0, col=false, unit=2/5, alt=false, line=0.2, solid=!$preview)
    makepoly(ldraw_lib__3004(solid), step=step, col=col, unit=unit, alt=alt, line=line, solid=solid);
ldraw_lib__3004(line=0.2);
// file: u9053.scad
use <../lib.scad>
use <../p/4-4cyli.scad>
use <../p/4-4edge.scad>
use <../p/4-4ring1.scad>
$fa=1; $fs=0.2;
function ldraw_lib__u9053(realsolid=false) = [
// 0 ~Technic Flex-System Hose End
// 0 Name: u9053.dat
// 0 Author: William Howard [WilliamH]
// 0 !LDRAW_ORG Part UPDATE 2011-02
// 0 !LICENSE Licensed under CC BY 2.0 and CC BY 4.0 : see CAreadme.txt
// 
// 0 BFC CERTIFY CCW
  [0,"BFC","CERTIFY"],
  [0,"BFC","CCW"],
// 
// 0 !HISTORY 2011-12-21 [cwdee] Reworked subparting technique
// 0 !HISTORY 2011-12-23 [PTadmin] Renamed from 76
// 0 !HISTORY 2011-12-29 [PTadmin] Official Update 2011-02
// 
// 
// 1 16 0 0 0 2 0 0 0 1 0 0 0 2 4-4ring1.dat
  [1,16,0,0,0,2,0,0,0,1,0,0,0,2, ldraw_lib__4_4ring1(realsolid)],
// 1 16 0 0 0 2 0 0 0 1 0 0 0 2 4-4edge.dat
  [1,16,0,0,0,2,0,0,0,1,0,0,0,2, ldraw_lib__4_4edge(realsolid)],
// 0 BFC INVERTNEXT
  [0,"BFC","INVERTNEXT"],
// 1 16 0 0 0 2 0 0 0 1 0 0 0 2 4-4cyli.dat
  [1,16,0,0,0,2,0,0,0,1,0,0,0,2, ldraw_lib__4_4cyli(realsolid)],
// 1 16 0 0 0 4 0 0 0 1 0 0 0 4 4-4edge.dat
  [1,16,0,0,0,4,0,0,0,1,0,0,0,4, ldraw_lib__4_4edge(realsolid)],
// 1 16 0 0 0 4 0 0 0 1 0 0 0 4 4-4cyli.dat
  [1,16,0,0,0,4,0,0,0,1,0,0,0,4, ldraw_lib__4_4cyli(realsolid)],
// 0
];
module ldraw_lib__u9053(step=0, col=false, unit=2/5, alt=false, line=0.2, solid=!$preview)
    makepoly(ldraw_lib__u9053(solid), step=step, col=col, unit=unit, alt=alt, line=line, solid=solid);
ldraw_lib__u9053(line=0.2);
// file: 77.scad
use <../lib.scad>
use <../p/4-4cyli.scad>
$fa=1; $fs=0.2;
function ldraw_lib__77(realsolid=false) = [
// 0 ~Technic Flex-System Hose Segment
// 0 Name: 77.dat
// 0 Author: William Howard [WilliamH]
// 0 !LDRAW_ORG Part UPDATE 2011-02
// 0 !LICENSE Licensed under CC BY 2.0 and CC BY 4.0 : see CAreadme.txt
// 
// 0 BFC CERTIFY CCW
  [0,"BFC","CERTIFY"],
  [0,"BFC","CCW"],
// 
// 0 !HISTORY 2011-12-21 [cwdee] Reworked subparting technique
// 0 !HISTORY 2011-12-29 [PTadmin] Official Update 2011-02
// 
// 
// 1 16 0 0 0 4 0 0 0 1 0 0 0 4 4-4cyli.dat
  [1,16,0,0,0,4,0,0,0,1,0,0,0,4, ldraw_lib__4_4cyli(realsolid)],
// 0 BFC INVERTNEXT
  [0,"BFC","INVERTNEXT"],
// 1 16 0 0 0 2 0 0 0 1 0 0 0 2 4-4cyli.dat
  [1,16,0,0,0,2,0,0,0,1,0,0,0,2, ldraw_lib__4_4cyli(realsolid)],
// 0
];
module ldraw_lib__77(step=0, col=false, unit=2/5, alt=false, line=0.2, solid=!$preview)
    makepoly(ldraw_lib__77(solid), step=step, col=col, unit=unit, alt=alt, line=line, solid=solid);
ldraw_lib__77(line=0.2);
// main file
use <../lib.scad>
use <77.scad>
use <u9053.scad>
$fa=1; $fs=0.2;
function ldraw_lib__71551(realsolid=false) = [
// 0 Technic Flex-System Hose 13L (260LDU)
// 0 Name: 71551.dat
// 0 Author: Tim Gould [timgould]
// 0 !LDRAW_ORG Part UPDATE 2011-02
// 0 !LICENSE Licensed under CC BY 2.0 and CC BY 4.0 : see CAreadme.txt
// 
// 0 BFC CERTIFY CCW
  [0,"BFC","CERTIFY"],
  [0,"BFC","CCW"],
// 
// 0 !KEYWORDS bar, tube
// 
// 0 !HISTORY 2011-12-29 [PTadmin] Official Update 2011-02
// 
// 
// 1 16 0 0 0 1 0 0 0 1 0 0 0 1 u9053.dat
  [1,16,0,0,0,1,0,0,0,1,0,0,0,1, ldraw_lib__u9053(realsolid)],
// 1 16 0 1 0 1 0 0 0 258 0 0 0 1 77.dat
  [1,16,0,1,0,1,0,0,0,258,0,0,0,1, ldraw_lib__77(realsolid)],
// 1 16 0 260 0 -1 0 0 0 -1 0 0 0 1 u9053.dat
  [1,16,0,260,0,-1,0,0,0,-1,0,0,0,1, ldraw_lib__u9053(realsolid)],
];
module ldraw_lib__71551(step=0, col=false, unit=2/5, alt=false, line=0.2, solid=!$preview)
    makepoly(ldraw_lib__71551(solid), step=step, col=col, unit=unit, alt=alt, line=line, solid=solid);
ldraw_lib__71551(line=0.2);
